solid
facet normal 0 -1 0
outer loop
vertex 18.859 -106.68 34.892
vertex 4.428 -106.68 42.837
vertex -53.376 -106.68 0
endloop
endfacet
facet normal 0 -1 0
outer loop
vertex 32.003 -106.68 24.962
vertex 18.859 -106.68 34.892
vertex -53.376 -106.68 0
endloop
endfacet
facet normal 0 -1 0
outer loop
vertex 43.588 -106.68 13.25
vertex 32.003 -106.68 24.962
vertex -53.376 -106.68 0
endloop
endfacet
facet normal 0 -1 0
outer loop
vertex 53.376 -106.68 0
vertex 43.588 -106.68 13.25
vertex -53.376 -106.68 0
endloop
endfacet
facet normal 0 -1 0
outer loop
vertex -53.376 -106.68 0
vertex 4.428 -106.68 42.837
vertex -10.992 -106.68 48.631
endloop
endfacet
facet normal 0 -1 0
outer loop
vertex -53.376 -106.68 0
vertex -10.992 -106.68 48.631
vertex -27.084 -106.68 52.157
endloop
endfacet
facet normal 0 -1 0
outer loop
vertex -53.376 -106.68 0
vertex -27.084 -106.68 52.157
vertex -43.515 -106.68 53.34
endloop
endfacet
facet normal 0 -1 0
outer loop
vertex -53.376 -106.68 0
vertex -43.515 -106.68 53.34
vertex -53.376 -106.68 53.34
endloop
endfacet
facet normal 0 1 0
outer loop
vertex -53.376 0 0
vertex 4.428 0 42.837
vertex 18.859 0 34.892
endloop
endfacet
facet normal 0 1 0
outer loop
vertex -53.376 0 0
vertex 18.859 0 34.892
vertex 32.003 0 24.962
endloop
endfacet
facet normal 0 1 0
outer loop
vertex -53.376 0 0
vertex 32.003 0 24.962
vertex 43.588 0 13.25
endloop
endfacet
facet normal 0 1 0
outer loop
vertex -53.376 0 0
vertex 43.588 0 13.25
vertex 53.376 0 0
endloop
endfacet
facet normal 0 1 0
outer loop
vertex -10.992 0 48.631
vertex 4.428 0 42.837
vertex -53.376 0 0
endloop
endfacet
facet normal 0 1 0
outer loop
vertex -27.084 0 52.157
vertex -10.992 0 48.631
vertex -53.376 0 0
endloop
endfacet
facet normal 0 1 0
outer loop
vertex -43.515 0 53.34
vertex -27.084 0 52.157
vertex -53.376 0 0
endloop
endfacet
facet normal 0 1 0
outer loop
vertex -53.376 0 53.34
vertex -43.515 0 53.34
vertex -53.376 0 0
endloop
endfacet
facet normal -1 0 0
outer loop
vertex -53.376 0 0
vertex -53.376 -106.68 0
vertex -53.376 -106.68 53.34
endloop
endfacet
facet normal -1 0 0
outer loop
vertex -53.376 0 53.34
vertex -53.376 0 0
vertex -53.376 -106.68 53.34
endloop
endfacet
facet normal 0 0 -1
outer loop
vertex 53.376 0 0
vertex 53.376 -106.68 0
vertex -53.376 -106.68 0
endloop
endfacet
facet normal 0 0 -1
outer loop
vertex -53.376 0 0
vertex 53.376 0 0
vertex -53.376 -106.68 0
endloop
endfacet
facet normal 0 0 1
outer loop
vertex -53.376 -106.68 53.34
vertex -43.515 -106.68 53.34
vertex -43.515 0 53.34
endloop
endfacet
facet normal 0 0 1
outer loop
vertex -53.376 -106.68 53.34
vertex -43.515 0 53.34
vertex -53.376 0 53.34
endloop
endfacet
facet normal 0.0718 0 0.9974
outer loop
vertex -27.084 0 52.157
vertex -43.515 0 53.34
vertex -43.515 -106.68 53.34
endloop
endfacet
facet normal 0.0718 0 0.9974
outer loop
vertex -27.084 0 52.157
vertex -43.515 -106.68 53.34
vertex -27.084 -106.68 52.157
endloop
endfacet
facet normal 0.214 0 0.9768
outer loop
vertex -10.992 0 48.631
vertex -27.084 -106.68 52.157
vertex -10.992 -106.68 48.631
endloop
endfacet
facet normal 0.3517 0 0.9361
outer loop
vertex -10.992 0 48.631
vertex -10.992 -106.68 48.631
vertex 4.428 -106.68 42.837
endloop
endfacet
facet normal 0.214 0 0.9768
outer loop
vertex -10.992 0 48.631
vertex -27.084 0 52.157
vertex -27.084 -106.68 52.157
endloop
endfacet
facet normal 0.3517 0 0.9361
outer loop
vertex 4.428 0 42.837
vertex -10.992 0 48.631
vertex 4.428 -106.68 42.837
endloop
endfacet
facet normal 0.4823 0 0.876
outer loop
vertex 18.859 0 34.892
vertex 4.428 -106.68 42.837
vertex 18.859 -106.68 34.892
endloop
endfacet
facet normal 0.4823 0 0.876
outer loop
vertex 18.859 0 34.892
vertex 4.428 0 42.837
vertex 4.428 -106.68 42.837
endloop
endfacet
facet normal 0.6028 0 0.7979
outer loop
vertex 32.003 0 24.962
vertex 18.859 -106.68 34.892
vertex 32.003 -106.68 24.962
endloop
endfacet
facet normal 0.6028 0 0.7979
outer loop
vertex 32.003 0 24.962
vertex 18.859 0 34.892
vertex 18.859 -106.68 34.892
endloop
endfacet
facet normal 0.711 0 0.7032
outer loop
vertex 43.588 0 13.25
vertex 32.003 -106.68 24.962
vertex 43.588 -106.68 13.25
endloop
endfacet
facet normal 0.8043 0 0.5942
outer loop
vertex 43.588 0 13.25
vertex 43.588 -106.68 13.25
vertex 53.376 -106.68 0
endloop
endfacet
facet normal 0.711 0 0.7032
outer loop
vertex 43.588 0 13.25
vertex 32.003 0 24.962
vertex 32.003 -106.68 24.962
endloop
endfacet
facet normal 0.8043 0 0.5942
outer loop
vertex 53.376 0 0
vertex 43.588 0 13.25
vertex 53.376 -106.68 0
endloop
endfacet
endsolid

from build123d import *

# Parameters (mm, degrees)
F0_W        = 53.3761642873
F0_H        = 53.3400028944
F1_DEPTH    = 53.34
F4_T1_DEPTH = 591.1352105984


# Not quite as in the source:
# - a fillet or chamfer that OpenCascade refuses, or shapes differently, is made with other operations: its cross-section is extruded or revolved along the edge and cut away or added


with BuildPart() as f1:
    # F0 (on Front) → F1 (new body)
    with BuildSketch(Plane.XZ):
        with Locations((-26.6880821437, 26.6700014472)):
            Rectangle(F0_W, F0_H)
    extrude(amount=F1_DEPTH)

    # F2: F1 across plane


with BuildPart() as f1_1:
    add(f1.part)
    add(f1.part.mirror(Plane.YZ))

    # F3: F1 across face


with BuildPart() as f1_2:
    add(f1_1.part)
    add(f1_1.part.mirror(Plane(origin=(0, -53.34, 26.6700014472), x_dir=(1, 0, 0), z_dir=(0, -1, 0))))

    # F4: fillet of radius 114.6703157856 on 1 edges, made by hand

    # F4_s2 → F4_t1 (cut)
    with BuildSketch(Plane.XZ.offset(-242.2276052992)):
        with BuildLine():
            ThreePointArc((-43.5148778323, 53.3400028944), (11.7866365045, 39.1237753005), (53.3761642873, 0))
            Line((53.3761642873, 0), (53.3761642873, 53.3400028944))
            Line((53.3761642873, 53.3400028944), (-43.5148778323, 53.3400028944))
        make_face()
    extrude(amount=F4_T1_DEPTH, mode=Mode.SUBTRACT)


solid = f1_2.part
